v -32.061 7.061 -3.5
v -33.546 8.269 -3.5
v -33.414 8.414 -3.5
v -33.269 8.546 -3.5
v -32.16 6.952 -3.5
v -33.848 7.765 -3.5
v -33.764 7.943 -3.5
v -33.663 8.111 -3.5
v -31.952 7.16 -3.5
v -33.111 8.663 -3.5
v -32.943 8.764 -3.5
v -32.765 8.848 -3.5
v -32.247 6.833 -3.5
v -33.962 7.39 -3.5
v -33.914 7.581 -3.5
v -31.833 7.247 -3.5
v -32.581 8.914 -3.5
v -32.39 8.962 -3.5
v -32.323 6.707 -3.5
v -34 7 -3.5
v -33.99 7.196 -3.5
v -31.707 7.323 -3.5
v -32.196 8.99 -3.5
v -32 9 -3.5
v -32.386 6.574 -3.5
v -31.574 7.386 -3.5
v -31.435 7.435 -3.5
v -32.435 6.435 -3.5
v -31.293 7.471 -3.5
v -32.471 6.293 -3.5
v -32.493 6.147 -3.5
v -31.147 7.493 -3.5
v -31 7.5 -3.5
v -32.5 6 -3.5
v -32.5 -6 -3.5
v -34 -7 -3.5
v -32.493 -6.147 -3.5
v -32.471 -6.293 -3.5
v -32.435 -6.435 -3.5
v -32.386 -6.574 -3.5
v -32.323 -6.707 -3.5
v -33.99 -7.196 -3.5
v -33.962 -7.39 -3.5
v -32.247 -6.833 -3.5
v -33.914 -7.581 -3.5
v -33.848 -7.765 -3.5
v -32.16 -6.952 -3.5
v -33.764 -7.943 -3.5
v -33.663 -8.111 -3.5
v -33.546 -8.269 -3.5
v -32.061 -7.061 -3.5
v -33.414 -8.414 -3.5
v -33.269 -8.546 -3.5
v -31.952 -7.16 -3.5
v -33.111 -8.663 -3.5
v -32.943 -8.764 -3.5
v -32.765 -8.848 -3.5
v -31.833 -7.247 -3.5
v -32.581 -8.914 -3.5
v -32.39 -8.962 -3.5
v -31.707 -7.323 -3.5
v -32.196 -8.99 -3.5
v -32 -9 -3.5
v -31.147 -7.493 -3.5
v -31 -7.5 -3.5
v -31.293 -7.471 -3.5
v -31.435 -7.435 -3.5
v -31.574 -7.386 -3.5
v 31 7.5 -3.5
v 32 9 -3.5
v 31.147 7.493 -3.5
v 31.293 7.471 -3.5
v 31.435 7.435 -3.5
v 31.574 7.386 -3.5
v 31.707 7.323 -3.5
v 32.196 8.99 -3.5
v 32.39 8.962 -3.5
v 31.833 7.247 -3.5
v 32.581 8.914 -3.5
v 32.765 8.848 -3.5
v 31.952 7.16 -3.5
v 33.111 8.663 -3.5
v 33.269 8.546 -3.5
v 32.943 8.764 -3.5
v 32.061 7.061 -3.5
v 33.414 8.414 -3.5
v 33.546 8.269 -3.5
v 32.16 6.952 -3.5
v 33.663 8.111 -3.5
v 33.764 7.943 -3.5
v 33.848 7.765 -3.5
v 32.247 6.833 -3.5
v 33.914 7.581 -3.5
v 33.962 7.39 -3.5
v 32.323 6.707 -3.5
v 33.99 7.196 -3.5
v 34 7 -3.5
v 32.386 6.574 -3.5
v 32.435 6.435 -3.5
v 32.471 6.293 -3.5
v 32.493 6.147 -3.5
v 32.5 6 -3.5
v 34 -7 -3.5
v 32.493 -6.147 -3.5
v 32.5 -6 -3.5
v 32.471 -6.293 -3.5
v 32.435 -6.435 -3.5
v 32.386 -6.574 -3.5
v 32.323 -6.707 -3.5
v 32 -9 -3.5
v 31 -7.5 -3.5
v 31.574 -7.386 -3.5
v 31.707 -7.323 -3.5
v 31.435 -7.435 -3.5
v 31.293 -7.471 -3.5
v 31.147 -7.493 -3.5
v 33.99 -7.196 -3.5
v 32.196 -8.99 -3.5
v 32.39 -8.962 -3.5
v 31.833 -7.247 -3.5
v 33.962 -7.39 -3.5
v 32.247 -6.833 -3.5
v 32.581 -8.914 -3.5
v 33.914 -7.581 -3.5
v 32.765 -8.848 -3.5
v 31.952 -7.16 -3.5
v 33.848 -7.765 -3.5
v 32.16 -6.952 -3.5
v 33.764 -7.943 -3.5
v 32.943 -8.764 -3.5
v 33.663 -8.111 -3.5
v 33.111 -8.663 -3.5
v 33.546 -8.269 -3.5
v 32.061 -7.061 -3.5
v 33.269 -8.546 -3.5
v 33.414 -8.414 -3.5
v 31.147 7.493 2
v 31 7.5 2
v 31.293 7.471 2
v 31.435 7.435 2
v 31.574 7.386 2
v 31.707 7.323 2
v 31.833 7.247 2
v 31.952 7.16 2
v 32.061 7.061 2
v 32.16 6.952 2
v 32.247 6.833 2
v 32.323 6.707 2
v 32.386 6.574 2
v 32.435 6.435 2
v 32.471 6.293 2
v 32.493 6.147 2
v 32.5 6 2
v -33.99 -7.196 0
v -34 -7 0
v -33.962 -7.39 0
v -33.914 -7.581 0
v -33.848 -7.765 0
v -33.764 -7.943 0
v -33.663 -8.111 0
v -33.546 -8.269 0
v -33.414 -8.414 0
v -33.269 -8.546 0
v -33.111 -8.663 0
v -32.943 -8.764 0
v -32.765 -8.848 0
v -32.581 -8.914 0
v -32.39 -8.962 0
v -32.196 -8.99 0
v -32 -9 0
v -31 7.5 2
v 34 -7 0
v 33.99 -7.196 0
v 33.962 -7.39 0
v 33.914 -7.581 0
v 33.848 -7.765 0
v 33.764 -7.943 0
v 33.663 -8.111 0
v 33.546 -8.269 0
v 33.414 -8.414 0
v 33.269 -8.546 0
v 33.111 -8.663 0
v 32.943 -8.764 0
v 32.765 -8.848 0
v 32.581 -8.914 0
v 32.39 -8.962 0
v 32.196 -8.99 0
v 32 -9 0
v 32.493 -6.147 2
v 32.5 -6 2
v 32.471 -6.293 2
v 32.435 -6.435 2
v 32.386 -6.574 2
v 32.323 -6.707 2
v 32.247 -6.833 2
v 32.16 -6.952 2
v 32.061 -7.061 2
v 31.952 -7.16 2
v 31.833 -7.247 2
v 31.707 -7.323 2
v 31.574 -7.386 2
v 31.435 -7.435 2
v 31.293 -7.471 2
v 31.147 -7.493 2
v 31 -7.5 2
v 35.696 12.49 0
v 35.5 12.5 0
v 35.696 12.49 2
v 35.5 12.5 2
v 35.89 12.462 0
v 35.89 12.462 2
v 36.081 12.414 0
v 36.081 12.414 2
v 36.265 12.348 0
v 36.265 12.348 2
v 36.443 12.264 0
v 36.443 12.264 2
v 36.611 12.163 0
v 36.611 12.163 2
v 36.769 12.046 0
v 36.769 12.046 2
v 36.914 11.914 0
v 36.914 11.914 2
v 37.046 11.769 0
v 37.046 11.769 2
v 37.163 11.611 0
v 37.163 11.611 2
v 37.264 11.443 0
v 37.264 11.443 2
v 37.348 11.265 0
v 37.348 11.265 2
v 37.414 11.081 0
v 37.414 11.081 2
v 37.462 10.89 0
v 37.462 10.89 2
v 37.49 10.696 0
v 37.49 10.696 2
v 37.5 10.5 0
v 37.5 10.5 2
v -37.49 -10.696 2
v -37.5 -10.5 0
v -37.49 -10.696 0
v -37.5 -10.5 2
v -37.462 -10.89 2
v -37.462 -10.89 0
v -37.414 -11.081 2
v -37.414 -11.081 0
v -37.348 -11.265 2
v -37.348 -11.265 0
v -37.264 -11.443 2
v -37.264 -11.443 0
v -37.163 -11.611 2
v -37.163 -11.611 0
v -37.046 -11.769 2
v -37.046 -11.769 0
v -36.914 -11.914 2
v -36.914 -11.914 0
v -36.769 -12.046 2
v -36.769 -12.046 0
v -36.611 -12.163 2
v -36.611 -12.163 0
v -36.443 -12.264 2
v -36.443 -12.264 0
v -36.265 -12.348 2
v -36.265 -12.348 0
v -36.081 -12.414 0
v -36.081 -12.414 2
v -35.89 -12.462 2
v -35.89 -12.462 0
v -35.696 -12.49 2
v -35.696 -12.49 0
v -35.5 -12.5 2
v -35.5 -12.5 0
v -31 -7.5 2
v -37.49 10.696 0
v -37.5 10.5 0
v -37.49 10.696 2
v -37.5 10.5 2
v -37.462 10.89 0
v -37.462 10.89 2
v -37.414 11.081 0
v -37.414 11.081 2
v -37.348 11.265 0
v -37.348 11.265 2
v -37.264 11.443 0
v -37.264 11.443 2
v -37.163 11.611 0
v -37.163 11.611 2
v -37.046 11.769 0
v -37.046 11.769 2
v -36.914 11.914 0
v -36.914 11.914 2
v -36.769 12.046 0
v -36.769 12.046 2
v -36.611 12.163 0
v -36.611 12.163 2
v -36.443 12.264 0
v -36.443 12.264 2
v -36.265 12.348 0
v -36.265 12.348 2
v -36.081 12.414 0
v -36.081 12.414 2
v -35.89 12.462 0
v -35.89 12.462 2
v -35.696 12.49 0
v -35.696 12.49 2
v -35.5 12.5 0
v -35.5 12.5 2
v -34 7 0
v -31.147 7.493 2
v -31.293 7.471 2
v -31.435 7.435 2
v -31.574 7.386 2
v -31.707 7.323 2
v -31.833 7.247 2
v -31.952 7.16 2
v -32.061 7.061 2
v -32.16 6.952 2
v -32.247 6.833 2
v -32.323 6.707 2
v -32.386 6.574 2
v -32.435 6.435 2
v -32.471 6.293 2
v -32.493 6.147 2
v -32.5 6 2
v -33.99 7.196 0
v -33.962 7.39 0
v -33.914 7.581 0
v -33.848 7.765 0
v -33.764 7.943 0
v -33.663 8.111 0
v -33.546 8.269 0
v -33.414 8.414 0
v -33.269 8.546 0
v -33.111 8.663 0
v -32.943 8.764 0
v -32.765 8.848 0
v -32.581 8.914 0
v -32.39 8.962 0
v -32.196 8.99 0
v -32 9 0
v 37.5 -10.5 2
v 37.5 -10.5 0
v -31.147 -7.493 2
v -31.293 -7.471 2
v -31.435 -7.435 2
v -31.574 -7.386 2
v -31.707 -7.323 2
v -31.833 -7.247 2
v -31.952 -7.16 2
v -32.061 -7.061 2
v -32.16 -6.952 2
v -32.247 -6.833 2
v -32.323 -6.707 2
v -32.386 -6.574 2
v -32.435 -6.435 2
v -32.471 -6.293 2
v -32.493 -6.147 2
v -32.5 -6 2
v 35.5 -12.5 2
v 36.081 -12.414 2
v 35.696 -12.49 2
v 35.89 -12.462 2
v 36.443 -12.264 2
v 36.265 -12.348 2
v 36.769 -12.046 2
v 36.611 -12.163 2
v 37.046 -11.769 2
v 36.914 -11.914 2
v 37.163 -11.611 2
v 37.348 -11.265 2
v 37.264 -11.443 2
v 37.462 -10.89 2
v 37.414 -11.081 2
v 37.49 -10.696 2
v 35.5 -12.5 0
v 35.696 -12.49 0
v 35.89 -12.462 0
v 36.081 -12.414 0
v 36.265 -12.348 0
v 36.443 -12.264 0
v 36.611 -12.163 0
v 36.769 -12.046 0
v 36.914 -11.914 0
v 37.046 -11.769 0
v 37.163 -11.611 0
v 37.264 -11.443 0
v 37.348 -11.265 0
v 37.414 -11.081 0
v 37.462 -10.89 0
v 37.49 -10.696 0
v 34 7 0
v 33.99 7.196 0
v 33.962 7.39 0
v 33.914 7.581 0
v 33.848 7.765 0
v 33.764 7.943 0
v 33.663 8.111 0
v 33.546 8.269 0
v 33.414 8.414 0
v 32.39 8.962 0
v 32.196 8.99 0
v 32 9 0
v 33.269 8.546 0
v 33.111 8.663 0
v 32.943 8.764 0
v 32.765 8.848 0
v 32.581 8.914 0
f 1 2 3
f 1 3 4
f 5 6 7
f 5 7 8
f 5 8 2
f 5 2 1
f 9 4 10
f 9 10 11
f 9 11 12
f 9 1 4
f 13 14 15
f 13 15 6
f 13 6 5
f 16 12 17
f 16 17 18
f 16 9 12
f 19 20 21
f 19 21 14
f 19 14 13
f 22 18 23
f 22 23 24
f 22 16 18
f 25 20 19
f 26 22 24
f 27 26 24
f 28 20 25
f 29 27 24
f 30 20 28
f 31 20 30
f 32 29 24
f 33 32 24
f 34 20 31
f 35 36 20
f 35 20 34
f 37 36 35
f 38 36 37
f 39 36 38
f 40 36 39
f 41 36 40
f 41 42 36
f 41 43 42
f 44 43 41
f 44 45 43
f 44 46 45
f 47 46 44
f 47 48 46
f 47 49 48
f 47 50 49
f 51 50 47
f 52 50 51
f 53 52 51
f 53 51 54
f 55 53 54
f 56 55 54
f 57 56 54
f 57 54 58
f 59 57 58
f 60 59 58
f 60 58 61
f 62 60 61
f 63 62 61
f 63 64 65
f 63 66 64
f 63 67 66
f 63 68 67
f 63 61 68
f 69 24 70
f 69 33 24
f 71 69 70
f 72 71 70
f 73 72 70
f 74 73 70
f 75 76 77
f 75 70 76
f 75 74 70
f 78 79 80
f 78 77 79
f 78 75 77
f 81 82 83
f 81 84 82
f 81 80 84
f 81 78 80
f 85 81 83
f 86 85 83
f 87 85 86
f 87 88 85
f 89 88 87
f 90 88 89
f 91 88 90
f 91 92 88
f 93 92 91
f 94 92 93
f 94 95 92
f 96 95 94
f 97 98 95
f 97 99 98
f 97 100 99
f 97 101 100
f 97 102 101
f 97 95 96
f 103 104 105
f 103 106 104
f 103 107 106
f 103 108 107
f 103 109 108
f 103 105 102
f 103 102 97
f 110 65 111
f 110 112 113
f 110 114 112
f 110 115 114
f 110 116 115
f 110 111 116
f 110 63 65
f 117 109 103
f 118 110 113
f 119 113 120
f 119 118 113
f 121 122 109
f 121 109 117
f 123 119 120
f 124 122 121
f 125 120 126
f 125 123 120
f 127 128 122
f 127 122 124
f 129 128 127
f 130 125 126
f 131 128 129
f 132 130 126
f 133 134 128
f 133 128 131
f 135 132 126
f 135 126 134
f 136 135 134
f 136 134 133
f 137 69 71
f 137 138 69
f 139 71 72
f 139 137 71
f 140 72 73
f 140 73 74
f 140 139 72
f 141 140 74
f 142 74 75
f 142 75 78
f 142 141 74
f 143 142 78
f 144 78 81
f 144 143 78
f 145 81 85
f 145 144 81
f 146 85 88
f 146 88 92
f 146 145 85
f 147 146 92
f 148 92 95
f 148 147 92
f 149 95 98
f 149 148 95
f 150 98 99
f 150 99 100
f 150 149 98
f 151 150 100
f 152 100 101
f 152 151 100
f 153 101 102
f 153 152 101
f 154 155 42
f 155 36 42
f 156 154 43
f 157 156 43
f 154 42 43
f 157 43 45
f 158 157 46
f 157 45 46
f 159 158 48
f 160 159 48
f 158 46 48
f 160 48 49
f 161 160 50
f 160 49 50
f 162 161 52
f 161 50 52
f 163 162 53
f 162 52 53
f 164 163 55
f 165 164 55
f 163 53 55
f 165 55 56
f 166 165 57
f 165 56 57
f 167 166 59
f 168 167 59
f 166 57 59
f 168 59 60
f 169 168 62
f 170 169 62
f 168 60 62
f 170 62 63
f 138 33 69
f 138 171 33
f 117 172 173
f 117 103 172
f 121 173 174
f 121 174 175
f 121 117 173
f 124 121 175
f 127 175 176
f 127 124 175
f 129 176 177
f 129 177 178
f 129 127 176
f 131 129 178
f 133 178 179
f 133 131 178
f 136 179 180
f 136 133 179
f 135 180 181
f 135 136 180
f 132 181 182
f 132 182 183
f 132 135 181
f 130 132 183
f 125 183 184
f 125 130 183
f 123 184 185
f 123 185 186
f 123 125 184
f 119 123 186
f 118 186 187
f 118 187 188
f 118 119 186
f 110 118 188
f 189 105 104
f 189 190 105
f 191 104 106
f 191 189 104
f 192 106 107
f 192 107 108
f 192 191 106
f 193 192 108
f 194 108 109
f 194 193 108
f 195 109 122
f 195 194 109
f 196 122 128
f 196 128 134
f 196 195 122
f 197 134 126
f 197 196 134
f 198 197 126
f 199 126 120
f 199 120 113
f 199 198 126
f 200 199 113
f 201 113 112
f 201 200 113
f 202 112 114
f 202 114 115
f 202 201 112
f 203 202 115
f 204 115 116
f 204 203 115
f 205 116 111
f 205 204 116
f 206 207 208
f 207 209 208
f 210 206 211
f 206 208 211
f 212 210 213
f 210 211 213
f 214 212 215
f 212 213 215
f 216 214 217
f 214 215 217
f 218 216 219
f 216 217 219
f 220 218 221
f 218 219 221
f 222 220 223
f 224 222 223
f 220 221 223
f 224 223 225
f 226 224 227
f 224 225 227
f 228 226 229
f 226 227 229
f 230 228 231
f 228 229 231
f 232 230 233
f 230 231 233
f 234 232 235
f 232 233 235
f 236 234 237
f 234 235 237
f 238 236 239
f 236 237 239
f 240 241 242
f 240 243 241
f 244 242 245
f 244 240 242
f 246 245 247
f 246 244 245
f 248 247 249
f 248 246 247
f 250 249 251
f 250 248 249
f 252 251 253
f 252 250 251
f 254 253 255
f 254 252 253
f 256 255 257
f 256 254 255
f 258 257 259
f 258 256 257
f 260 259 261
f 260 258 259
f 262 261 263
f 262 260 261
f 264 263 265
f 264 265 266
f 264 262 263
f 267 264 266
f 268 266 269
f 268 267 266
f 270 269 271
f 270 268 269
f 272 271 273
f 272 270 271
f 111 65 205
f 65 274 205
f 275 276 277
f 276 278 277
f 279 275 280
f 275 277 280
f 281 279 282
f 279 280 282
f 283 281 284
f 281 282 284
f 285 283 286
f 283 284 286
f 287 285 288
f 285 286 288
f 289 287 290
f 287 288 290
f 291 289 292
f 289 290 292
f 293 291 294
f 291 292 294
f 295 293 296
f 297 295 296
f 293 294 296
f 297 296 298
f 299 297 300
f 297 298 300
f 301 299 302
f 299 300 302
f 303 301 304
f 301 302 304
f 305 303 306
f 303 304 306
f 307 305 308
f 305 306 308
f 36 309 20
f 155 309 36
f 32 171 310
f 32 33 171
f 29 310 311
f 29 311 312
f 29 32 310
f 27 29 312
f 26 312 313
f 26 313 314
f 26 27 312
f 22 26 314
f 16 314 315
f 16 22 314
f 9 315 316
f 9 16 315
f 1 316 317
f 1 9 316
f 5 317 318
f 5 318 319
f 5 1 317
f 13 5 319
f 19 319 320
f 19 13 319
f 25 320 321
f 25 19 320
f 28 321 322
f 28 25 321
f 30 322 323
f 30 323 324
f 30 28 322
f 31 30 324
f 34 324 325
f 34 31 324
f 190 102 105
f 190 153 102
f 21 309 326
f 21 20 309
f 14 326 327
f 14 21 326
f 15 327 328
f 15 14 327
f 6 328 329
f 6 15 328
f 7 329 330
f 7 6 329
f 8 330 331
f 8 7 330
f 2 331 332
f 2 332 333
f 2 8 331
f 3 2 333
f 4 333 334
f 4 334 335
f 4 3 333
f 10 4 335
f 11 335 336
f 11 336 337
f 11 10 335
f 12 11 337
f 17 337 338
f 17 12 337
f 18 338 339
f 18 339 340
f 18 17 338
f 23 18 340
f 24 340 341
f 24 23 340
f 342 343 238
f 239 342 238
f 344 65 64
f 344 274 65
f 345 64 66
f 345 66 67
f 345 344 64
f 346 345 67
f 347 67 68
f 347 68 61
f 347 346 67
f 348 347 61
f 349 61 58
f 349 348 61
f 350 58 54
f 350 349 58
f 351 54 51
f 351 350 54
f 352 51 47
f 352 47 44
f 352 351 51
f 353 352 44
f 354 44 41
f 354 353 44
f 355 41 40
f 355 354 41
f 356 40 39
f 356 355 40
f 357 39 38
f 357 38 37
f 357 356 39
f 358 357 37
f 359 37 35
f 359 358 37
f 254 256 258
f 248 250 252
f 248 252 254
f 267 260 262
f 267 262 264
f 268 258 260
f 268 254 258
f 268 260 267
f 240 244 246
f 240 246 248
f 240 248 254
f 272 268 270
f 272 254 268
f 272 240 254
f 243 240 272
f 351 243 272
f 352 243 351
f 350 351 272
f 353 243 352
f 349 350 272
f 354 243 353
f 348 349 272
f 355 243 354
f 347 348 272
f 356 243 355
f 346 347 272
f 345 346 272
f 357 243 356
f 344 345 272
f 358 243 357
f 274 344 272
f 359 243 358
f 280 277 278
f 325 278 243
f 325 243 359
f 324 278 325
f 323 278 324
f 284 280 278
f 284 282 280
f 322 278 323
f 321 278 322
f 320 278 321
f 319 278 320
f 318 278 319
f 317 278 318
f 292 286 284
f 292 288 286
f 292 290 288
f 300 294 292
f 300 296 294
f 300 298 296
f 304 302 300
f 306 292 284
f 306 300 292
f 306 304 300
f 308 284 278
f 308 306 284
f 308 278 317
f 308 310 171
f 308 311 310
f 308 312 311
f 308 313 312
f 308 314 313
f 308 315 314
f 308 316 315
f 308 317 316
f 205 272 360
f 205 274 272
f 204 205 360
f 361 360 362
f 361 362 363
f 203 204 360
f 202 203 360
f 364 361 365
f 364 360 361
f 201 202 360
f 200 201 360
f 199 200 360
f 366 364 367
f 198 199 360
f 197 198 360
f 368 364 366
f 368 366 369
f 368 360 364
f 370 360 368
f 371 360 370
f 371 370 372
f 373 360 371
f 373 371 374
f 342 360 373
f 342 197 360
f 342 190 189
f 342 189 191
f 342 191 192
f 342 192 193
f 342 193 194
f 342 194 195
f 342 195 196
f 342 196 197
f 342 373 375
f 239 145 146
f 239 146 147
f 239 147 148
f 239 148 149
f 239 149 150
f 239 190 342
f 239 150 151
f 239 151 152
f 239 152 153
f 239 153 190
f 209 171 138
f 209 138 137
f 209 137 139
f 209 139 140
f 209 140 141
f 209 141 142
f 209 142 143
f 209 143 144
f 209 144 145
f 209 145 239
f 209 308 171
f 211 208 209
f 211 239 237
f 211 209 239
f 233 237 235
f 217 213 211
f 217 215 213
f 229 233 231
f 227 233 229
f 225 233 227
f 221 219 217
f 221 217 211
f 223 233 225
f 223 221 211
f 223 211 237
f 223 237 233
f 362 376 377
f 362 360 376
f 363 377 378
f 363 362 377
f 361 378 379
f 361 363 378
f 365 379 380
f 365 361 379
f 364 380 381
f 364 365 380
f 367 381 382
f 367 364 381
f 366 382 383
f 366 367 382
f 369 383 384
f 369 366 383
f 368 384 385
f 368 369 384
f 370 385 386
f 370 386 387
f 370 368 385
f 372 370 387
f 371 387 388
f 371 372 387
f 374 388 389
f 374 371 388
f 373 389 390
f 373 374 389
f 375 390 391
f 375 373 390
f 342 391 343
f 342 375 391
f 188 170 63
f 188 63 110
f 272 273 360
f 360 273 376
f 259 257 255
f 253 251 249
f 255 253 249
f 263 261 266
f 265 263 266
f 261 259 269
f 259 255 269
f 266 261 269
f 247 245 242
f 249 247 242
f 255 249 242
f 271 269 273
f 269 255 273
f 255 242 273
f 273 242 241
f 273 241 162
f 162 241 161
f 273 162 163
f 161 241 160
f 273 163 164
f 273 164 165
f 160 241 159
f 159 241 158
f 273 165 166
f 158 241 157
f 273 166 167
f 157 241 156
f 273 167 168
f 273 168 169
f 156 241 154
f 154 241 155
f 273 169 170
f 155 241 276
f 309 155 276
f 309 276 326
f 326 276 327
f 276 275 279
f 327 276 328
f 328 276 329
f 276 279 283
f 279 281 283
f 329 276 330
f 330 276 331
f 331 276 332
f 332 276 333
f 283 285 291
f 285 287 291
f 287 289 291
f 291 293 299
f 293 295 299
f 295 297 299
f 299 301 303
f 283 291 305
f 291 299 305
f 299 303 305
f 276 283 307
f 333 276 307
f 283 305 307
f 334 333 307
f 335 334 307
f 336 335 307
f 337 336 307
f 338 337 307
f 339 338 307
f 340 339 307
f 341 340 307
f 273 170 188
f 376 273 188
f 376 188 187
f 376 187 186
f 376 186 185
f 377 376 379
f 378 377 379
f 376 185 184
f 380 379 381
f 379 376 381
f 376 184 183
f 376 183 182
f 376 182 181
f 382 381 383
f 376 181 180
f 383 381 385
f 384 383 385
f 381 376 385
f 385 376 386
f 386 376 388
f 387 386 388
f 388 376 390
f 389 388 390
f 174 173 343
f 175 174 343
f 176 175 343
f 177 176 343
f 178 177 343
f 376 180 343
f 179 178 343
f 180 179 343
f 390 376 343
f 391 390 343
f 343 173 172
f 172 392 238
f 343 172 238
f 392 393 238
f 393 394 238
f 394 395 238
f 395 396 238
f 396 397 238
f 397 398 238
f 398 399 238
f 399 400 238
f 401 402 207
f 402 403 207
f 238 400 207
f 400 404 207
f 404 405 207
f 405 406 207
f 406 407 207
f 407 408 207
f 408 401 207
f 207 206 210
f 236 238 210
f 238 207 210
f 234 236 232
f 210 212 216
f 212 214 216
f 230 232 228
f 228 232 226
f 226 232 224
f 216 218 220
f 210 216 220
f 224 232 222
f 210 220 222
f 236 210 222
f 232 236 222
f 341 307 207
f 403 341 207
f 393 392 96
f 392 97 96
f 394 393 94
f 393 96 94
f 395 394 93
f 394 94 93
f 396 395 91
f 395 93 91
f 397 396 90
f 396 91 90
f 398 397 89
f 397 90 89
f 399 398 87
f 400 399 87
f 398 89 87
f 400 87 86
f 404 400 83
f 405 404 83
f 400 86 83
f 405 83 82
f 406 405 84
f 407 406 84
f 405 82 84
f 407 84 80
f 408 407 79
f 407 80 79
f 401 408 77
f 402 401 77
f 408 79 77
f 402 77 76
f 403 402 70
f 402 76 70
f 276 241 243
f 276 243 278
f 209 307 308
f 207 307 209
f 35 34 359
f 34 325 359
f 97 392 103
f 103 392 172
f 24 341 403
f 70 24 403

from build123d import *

# Parameters (mm, degrees)
F0_W     = 75
F0_H     = 25
F0_W_2   = 65
F0_H_2   = 15
F1_DEPTH = 2
F2_R     = 2
F3_W     = 68
F3_H     = 18
F3_W_2   = 65
F3_H_2   = 15
F4_DEPTH = 3.5
F5_R     = 2
F6_R     = 1.5


with BuildPart() as f1:
    # F0 (on Top) → F1 (new body)
    with BuildSketch(Plane.XY):
        Rectangle(F0_W, F0_H)
        Rectangle(F0_W_2, F0_H_2, mode=Mode.SUBTRACT)
    extrude(amount=F1_DEPTH)

    # F2
    f2_edges = [f1.edges().sort_by_distance(p)[0] for p in [
        (37.5, 12.5, 1),
        (37.5, -12.5, 1),
        (-37.5, -12.5, 1),
        (-37.5, 12.5, 1),
    ]]
    fillet(f2_edges, radius=F2_R)

    # F3 (on face) → F4 (join)
    with BuildSketch(Plane(origin=(0, 0, 0), x_dir=(1, 0, 0), z_dir=(0, 0, -1))):
        Rectangle(F3_W, F3_H)
        Rectangle(F3_W_2, F3_H_2, mode=Mode.SUBTRACT)
    extrude(amount=F4_DEPTH)

    # F5
    f5_edges = [f1.edges().sort_by_distance(p)[0] for p in [
        (34, -9, -1.75),
        (-34, -9, -1.75),
        (-34, 9, -1.75),
        (34, 9, -1.75),
    ]]
    fillet(f5_edges, radius=F5_R)

    # F6
    f6_edges = [f1.edges().sort_by_distance(p)[0] for p in [
        (32.5, 7.5, -0.75),
        (32.5, -7.5, -0.75),
        (-32.5, -7.5, -0.75),
        (-32.5, 7.5, -0.75),
    ]]
    fillet(f6_edges, radius=F6_R)


solid = f1.part
